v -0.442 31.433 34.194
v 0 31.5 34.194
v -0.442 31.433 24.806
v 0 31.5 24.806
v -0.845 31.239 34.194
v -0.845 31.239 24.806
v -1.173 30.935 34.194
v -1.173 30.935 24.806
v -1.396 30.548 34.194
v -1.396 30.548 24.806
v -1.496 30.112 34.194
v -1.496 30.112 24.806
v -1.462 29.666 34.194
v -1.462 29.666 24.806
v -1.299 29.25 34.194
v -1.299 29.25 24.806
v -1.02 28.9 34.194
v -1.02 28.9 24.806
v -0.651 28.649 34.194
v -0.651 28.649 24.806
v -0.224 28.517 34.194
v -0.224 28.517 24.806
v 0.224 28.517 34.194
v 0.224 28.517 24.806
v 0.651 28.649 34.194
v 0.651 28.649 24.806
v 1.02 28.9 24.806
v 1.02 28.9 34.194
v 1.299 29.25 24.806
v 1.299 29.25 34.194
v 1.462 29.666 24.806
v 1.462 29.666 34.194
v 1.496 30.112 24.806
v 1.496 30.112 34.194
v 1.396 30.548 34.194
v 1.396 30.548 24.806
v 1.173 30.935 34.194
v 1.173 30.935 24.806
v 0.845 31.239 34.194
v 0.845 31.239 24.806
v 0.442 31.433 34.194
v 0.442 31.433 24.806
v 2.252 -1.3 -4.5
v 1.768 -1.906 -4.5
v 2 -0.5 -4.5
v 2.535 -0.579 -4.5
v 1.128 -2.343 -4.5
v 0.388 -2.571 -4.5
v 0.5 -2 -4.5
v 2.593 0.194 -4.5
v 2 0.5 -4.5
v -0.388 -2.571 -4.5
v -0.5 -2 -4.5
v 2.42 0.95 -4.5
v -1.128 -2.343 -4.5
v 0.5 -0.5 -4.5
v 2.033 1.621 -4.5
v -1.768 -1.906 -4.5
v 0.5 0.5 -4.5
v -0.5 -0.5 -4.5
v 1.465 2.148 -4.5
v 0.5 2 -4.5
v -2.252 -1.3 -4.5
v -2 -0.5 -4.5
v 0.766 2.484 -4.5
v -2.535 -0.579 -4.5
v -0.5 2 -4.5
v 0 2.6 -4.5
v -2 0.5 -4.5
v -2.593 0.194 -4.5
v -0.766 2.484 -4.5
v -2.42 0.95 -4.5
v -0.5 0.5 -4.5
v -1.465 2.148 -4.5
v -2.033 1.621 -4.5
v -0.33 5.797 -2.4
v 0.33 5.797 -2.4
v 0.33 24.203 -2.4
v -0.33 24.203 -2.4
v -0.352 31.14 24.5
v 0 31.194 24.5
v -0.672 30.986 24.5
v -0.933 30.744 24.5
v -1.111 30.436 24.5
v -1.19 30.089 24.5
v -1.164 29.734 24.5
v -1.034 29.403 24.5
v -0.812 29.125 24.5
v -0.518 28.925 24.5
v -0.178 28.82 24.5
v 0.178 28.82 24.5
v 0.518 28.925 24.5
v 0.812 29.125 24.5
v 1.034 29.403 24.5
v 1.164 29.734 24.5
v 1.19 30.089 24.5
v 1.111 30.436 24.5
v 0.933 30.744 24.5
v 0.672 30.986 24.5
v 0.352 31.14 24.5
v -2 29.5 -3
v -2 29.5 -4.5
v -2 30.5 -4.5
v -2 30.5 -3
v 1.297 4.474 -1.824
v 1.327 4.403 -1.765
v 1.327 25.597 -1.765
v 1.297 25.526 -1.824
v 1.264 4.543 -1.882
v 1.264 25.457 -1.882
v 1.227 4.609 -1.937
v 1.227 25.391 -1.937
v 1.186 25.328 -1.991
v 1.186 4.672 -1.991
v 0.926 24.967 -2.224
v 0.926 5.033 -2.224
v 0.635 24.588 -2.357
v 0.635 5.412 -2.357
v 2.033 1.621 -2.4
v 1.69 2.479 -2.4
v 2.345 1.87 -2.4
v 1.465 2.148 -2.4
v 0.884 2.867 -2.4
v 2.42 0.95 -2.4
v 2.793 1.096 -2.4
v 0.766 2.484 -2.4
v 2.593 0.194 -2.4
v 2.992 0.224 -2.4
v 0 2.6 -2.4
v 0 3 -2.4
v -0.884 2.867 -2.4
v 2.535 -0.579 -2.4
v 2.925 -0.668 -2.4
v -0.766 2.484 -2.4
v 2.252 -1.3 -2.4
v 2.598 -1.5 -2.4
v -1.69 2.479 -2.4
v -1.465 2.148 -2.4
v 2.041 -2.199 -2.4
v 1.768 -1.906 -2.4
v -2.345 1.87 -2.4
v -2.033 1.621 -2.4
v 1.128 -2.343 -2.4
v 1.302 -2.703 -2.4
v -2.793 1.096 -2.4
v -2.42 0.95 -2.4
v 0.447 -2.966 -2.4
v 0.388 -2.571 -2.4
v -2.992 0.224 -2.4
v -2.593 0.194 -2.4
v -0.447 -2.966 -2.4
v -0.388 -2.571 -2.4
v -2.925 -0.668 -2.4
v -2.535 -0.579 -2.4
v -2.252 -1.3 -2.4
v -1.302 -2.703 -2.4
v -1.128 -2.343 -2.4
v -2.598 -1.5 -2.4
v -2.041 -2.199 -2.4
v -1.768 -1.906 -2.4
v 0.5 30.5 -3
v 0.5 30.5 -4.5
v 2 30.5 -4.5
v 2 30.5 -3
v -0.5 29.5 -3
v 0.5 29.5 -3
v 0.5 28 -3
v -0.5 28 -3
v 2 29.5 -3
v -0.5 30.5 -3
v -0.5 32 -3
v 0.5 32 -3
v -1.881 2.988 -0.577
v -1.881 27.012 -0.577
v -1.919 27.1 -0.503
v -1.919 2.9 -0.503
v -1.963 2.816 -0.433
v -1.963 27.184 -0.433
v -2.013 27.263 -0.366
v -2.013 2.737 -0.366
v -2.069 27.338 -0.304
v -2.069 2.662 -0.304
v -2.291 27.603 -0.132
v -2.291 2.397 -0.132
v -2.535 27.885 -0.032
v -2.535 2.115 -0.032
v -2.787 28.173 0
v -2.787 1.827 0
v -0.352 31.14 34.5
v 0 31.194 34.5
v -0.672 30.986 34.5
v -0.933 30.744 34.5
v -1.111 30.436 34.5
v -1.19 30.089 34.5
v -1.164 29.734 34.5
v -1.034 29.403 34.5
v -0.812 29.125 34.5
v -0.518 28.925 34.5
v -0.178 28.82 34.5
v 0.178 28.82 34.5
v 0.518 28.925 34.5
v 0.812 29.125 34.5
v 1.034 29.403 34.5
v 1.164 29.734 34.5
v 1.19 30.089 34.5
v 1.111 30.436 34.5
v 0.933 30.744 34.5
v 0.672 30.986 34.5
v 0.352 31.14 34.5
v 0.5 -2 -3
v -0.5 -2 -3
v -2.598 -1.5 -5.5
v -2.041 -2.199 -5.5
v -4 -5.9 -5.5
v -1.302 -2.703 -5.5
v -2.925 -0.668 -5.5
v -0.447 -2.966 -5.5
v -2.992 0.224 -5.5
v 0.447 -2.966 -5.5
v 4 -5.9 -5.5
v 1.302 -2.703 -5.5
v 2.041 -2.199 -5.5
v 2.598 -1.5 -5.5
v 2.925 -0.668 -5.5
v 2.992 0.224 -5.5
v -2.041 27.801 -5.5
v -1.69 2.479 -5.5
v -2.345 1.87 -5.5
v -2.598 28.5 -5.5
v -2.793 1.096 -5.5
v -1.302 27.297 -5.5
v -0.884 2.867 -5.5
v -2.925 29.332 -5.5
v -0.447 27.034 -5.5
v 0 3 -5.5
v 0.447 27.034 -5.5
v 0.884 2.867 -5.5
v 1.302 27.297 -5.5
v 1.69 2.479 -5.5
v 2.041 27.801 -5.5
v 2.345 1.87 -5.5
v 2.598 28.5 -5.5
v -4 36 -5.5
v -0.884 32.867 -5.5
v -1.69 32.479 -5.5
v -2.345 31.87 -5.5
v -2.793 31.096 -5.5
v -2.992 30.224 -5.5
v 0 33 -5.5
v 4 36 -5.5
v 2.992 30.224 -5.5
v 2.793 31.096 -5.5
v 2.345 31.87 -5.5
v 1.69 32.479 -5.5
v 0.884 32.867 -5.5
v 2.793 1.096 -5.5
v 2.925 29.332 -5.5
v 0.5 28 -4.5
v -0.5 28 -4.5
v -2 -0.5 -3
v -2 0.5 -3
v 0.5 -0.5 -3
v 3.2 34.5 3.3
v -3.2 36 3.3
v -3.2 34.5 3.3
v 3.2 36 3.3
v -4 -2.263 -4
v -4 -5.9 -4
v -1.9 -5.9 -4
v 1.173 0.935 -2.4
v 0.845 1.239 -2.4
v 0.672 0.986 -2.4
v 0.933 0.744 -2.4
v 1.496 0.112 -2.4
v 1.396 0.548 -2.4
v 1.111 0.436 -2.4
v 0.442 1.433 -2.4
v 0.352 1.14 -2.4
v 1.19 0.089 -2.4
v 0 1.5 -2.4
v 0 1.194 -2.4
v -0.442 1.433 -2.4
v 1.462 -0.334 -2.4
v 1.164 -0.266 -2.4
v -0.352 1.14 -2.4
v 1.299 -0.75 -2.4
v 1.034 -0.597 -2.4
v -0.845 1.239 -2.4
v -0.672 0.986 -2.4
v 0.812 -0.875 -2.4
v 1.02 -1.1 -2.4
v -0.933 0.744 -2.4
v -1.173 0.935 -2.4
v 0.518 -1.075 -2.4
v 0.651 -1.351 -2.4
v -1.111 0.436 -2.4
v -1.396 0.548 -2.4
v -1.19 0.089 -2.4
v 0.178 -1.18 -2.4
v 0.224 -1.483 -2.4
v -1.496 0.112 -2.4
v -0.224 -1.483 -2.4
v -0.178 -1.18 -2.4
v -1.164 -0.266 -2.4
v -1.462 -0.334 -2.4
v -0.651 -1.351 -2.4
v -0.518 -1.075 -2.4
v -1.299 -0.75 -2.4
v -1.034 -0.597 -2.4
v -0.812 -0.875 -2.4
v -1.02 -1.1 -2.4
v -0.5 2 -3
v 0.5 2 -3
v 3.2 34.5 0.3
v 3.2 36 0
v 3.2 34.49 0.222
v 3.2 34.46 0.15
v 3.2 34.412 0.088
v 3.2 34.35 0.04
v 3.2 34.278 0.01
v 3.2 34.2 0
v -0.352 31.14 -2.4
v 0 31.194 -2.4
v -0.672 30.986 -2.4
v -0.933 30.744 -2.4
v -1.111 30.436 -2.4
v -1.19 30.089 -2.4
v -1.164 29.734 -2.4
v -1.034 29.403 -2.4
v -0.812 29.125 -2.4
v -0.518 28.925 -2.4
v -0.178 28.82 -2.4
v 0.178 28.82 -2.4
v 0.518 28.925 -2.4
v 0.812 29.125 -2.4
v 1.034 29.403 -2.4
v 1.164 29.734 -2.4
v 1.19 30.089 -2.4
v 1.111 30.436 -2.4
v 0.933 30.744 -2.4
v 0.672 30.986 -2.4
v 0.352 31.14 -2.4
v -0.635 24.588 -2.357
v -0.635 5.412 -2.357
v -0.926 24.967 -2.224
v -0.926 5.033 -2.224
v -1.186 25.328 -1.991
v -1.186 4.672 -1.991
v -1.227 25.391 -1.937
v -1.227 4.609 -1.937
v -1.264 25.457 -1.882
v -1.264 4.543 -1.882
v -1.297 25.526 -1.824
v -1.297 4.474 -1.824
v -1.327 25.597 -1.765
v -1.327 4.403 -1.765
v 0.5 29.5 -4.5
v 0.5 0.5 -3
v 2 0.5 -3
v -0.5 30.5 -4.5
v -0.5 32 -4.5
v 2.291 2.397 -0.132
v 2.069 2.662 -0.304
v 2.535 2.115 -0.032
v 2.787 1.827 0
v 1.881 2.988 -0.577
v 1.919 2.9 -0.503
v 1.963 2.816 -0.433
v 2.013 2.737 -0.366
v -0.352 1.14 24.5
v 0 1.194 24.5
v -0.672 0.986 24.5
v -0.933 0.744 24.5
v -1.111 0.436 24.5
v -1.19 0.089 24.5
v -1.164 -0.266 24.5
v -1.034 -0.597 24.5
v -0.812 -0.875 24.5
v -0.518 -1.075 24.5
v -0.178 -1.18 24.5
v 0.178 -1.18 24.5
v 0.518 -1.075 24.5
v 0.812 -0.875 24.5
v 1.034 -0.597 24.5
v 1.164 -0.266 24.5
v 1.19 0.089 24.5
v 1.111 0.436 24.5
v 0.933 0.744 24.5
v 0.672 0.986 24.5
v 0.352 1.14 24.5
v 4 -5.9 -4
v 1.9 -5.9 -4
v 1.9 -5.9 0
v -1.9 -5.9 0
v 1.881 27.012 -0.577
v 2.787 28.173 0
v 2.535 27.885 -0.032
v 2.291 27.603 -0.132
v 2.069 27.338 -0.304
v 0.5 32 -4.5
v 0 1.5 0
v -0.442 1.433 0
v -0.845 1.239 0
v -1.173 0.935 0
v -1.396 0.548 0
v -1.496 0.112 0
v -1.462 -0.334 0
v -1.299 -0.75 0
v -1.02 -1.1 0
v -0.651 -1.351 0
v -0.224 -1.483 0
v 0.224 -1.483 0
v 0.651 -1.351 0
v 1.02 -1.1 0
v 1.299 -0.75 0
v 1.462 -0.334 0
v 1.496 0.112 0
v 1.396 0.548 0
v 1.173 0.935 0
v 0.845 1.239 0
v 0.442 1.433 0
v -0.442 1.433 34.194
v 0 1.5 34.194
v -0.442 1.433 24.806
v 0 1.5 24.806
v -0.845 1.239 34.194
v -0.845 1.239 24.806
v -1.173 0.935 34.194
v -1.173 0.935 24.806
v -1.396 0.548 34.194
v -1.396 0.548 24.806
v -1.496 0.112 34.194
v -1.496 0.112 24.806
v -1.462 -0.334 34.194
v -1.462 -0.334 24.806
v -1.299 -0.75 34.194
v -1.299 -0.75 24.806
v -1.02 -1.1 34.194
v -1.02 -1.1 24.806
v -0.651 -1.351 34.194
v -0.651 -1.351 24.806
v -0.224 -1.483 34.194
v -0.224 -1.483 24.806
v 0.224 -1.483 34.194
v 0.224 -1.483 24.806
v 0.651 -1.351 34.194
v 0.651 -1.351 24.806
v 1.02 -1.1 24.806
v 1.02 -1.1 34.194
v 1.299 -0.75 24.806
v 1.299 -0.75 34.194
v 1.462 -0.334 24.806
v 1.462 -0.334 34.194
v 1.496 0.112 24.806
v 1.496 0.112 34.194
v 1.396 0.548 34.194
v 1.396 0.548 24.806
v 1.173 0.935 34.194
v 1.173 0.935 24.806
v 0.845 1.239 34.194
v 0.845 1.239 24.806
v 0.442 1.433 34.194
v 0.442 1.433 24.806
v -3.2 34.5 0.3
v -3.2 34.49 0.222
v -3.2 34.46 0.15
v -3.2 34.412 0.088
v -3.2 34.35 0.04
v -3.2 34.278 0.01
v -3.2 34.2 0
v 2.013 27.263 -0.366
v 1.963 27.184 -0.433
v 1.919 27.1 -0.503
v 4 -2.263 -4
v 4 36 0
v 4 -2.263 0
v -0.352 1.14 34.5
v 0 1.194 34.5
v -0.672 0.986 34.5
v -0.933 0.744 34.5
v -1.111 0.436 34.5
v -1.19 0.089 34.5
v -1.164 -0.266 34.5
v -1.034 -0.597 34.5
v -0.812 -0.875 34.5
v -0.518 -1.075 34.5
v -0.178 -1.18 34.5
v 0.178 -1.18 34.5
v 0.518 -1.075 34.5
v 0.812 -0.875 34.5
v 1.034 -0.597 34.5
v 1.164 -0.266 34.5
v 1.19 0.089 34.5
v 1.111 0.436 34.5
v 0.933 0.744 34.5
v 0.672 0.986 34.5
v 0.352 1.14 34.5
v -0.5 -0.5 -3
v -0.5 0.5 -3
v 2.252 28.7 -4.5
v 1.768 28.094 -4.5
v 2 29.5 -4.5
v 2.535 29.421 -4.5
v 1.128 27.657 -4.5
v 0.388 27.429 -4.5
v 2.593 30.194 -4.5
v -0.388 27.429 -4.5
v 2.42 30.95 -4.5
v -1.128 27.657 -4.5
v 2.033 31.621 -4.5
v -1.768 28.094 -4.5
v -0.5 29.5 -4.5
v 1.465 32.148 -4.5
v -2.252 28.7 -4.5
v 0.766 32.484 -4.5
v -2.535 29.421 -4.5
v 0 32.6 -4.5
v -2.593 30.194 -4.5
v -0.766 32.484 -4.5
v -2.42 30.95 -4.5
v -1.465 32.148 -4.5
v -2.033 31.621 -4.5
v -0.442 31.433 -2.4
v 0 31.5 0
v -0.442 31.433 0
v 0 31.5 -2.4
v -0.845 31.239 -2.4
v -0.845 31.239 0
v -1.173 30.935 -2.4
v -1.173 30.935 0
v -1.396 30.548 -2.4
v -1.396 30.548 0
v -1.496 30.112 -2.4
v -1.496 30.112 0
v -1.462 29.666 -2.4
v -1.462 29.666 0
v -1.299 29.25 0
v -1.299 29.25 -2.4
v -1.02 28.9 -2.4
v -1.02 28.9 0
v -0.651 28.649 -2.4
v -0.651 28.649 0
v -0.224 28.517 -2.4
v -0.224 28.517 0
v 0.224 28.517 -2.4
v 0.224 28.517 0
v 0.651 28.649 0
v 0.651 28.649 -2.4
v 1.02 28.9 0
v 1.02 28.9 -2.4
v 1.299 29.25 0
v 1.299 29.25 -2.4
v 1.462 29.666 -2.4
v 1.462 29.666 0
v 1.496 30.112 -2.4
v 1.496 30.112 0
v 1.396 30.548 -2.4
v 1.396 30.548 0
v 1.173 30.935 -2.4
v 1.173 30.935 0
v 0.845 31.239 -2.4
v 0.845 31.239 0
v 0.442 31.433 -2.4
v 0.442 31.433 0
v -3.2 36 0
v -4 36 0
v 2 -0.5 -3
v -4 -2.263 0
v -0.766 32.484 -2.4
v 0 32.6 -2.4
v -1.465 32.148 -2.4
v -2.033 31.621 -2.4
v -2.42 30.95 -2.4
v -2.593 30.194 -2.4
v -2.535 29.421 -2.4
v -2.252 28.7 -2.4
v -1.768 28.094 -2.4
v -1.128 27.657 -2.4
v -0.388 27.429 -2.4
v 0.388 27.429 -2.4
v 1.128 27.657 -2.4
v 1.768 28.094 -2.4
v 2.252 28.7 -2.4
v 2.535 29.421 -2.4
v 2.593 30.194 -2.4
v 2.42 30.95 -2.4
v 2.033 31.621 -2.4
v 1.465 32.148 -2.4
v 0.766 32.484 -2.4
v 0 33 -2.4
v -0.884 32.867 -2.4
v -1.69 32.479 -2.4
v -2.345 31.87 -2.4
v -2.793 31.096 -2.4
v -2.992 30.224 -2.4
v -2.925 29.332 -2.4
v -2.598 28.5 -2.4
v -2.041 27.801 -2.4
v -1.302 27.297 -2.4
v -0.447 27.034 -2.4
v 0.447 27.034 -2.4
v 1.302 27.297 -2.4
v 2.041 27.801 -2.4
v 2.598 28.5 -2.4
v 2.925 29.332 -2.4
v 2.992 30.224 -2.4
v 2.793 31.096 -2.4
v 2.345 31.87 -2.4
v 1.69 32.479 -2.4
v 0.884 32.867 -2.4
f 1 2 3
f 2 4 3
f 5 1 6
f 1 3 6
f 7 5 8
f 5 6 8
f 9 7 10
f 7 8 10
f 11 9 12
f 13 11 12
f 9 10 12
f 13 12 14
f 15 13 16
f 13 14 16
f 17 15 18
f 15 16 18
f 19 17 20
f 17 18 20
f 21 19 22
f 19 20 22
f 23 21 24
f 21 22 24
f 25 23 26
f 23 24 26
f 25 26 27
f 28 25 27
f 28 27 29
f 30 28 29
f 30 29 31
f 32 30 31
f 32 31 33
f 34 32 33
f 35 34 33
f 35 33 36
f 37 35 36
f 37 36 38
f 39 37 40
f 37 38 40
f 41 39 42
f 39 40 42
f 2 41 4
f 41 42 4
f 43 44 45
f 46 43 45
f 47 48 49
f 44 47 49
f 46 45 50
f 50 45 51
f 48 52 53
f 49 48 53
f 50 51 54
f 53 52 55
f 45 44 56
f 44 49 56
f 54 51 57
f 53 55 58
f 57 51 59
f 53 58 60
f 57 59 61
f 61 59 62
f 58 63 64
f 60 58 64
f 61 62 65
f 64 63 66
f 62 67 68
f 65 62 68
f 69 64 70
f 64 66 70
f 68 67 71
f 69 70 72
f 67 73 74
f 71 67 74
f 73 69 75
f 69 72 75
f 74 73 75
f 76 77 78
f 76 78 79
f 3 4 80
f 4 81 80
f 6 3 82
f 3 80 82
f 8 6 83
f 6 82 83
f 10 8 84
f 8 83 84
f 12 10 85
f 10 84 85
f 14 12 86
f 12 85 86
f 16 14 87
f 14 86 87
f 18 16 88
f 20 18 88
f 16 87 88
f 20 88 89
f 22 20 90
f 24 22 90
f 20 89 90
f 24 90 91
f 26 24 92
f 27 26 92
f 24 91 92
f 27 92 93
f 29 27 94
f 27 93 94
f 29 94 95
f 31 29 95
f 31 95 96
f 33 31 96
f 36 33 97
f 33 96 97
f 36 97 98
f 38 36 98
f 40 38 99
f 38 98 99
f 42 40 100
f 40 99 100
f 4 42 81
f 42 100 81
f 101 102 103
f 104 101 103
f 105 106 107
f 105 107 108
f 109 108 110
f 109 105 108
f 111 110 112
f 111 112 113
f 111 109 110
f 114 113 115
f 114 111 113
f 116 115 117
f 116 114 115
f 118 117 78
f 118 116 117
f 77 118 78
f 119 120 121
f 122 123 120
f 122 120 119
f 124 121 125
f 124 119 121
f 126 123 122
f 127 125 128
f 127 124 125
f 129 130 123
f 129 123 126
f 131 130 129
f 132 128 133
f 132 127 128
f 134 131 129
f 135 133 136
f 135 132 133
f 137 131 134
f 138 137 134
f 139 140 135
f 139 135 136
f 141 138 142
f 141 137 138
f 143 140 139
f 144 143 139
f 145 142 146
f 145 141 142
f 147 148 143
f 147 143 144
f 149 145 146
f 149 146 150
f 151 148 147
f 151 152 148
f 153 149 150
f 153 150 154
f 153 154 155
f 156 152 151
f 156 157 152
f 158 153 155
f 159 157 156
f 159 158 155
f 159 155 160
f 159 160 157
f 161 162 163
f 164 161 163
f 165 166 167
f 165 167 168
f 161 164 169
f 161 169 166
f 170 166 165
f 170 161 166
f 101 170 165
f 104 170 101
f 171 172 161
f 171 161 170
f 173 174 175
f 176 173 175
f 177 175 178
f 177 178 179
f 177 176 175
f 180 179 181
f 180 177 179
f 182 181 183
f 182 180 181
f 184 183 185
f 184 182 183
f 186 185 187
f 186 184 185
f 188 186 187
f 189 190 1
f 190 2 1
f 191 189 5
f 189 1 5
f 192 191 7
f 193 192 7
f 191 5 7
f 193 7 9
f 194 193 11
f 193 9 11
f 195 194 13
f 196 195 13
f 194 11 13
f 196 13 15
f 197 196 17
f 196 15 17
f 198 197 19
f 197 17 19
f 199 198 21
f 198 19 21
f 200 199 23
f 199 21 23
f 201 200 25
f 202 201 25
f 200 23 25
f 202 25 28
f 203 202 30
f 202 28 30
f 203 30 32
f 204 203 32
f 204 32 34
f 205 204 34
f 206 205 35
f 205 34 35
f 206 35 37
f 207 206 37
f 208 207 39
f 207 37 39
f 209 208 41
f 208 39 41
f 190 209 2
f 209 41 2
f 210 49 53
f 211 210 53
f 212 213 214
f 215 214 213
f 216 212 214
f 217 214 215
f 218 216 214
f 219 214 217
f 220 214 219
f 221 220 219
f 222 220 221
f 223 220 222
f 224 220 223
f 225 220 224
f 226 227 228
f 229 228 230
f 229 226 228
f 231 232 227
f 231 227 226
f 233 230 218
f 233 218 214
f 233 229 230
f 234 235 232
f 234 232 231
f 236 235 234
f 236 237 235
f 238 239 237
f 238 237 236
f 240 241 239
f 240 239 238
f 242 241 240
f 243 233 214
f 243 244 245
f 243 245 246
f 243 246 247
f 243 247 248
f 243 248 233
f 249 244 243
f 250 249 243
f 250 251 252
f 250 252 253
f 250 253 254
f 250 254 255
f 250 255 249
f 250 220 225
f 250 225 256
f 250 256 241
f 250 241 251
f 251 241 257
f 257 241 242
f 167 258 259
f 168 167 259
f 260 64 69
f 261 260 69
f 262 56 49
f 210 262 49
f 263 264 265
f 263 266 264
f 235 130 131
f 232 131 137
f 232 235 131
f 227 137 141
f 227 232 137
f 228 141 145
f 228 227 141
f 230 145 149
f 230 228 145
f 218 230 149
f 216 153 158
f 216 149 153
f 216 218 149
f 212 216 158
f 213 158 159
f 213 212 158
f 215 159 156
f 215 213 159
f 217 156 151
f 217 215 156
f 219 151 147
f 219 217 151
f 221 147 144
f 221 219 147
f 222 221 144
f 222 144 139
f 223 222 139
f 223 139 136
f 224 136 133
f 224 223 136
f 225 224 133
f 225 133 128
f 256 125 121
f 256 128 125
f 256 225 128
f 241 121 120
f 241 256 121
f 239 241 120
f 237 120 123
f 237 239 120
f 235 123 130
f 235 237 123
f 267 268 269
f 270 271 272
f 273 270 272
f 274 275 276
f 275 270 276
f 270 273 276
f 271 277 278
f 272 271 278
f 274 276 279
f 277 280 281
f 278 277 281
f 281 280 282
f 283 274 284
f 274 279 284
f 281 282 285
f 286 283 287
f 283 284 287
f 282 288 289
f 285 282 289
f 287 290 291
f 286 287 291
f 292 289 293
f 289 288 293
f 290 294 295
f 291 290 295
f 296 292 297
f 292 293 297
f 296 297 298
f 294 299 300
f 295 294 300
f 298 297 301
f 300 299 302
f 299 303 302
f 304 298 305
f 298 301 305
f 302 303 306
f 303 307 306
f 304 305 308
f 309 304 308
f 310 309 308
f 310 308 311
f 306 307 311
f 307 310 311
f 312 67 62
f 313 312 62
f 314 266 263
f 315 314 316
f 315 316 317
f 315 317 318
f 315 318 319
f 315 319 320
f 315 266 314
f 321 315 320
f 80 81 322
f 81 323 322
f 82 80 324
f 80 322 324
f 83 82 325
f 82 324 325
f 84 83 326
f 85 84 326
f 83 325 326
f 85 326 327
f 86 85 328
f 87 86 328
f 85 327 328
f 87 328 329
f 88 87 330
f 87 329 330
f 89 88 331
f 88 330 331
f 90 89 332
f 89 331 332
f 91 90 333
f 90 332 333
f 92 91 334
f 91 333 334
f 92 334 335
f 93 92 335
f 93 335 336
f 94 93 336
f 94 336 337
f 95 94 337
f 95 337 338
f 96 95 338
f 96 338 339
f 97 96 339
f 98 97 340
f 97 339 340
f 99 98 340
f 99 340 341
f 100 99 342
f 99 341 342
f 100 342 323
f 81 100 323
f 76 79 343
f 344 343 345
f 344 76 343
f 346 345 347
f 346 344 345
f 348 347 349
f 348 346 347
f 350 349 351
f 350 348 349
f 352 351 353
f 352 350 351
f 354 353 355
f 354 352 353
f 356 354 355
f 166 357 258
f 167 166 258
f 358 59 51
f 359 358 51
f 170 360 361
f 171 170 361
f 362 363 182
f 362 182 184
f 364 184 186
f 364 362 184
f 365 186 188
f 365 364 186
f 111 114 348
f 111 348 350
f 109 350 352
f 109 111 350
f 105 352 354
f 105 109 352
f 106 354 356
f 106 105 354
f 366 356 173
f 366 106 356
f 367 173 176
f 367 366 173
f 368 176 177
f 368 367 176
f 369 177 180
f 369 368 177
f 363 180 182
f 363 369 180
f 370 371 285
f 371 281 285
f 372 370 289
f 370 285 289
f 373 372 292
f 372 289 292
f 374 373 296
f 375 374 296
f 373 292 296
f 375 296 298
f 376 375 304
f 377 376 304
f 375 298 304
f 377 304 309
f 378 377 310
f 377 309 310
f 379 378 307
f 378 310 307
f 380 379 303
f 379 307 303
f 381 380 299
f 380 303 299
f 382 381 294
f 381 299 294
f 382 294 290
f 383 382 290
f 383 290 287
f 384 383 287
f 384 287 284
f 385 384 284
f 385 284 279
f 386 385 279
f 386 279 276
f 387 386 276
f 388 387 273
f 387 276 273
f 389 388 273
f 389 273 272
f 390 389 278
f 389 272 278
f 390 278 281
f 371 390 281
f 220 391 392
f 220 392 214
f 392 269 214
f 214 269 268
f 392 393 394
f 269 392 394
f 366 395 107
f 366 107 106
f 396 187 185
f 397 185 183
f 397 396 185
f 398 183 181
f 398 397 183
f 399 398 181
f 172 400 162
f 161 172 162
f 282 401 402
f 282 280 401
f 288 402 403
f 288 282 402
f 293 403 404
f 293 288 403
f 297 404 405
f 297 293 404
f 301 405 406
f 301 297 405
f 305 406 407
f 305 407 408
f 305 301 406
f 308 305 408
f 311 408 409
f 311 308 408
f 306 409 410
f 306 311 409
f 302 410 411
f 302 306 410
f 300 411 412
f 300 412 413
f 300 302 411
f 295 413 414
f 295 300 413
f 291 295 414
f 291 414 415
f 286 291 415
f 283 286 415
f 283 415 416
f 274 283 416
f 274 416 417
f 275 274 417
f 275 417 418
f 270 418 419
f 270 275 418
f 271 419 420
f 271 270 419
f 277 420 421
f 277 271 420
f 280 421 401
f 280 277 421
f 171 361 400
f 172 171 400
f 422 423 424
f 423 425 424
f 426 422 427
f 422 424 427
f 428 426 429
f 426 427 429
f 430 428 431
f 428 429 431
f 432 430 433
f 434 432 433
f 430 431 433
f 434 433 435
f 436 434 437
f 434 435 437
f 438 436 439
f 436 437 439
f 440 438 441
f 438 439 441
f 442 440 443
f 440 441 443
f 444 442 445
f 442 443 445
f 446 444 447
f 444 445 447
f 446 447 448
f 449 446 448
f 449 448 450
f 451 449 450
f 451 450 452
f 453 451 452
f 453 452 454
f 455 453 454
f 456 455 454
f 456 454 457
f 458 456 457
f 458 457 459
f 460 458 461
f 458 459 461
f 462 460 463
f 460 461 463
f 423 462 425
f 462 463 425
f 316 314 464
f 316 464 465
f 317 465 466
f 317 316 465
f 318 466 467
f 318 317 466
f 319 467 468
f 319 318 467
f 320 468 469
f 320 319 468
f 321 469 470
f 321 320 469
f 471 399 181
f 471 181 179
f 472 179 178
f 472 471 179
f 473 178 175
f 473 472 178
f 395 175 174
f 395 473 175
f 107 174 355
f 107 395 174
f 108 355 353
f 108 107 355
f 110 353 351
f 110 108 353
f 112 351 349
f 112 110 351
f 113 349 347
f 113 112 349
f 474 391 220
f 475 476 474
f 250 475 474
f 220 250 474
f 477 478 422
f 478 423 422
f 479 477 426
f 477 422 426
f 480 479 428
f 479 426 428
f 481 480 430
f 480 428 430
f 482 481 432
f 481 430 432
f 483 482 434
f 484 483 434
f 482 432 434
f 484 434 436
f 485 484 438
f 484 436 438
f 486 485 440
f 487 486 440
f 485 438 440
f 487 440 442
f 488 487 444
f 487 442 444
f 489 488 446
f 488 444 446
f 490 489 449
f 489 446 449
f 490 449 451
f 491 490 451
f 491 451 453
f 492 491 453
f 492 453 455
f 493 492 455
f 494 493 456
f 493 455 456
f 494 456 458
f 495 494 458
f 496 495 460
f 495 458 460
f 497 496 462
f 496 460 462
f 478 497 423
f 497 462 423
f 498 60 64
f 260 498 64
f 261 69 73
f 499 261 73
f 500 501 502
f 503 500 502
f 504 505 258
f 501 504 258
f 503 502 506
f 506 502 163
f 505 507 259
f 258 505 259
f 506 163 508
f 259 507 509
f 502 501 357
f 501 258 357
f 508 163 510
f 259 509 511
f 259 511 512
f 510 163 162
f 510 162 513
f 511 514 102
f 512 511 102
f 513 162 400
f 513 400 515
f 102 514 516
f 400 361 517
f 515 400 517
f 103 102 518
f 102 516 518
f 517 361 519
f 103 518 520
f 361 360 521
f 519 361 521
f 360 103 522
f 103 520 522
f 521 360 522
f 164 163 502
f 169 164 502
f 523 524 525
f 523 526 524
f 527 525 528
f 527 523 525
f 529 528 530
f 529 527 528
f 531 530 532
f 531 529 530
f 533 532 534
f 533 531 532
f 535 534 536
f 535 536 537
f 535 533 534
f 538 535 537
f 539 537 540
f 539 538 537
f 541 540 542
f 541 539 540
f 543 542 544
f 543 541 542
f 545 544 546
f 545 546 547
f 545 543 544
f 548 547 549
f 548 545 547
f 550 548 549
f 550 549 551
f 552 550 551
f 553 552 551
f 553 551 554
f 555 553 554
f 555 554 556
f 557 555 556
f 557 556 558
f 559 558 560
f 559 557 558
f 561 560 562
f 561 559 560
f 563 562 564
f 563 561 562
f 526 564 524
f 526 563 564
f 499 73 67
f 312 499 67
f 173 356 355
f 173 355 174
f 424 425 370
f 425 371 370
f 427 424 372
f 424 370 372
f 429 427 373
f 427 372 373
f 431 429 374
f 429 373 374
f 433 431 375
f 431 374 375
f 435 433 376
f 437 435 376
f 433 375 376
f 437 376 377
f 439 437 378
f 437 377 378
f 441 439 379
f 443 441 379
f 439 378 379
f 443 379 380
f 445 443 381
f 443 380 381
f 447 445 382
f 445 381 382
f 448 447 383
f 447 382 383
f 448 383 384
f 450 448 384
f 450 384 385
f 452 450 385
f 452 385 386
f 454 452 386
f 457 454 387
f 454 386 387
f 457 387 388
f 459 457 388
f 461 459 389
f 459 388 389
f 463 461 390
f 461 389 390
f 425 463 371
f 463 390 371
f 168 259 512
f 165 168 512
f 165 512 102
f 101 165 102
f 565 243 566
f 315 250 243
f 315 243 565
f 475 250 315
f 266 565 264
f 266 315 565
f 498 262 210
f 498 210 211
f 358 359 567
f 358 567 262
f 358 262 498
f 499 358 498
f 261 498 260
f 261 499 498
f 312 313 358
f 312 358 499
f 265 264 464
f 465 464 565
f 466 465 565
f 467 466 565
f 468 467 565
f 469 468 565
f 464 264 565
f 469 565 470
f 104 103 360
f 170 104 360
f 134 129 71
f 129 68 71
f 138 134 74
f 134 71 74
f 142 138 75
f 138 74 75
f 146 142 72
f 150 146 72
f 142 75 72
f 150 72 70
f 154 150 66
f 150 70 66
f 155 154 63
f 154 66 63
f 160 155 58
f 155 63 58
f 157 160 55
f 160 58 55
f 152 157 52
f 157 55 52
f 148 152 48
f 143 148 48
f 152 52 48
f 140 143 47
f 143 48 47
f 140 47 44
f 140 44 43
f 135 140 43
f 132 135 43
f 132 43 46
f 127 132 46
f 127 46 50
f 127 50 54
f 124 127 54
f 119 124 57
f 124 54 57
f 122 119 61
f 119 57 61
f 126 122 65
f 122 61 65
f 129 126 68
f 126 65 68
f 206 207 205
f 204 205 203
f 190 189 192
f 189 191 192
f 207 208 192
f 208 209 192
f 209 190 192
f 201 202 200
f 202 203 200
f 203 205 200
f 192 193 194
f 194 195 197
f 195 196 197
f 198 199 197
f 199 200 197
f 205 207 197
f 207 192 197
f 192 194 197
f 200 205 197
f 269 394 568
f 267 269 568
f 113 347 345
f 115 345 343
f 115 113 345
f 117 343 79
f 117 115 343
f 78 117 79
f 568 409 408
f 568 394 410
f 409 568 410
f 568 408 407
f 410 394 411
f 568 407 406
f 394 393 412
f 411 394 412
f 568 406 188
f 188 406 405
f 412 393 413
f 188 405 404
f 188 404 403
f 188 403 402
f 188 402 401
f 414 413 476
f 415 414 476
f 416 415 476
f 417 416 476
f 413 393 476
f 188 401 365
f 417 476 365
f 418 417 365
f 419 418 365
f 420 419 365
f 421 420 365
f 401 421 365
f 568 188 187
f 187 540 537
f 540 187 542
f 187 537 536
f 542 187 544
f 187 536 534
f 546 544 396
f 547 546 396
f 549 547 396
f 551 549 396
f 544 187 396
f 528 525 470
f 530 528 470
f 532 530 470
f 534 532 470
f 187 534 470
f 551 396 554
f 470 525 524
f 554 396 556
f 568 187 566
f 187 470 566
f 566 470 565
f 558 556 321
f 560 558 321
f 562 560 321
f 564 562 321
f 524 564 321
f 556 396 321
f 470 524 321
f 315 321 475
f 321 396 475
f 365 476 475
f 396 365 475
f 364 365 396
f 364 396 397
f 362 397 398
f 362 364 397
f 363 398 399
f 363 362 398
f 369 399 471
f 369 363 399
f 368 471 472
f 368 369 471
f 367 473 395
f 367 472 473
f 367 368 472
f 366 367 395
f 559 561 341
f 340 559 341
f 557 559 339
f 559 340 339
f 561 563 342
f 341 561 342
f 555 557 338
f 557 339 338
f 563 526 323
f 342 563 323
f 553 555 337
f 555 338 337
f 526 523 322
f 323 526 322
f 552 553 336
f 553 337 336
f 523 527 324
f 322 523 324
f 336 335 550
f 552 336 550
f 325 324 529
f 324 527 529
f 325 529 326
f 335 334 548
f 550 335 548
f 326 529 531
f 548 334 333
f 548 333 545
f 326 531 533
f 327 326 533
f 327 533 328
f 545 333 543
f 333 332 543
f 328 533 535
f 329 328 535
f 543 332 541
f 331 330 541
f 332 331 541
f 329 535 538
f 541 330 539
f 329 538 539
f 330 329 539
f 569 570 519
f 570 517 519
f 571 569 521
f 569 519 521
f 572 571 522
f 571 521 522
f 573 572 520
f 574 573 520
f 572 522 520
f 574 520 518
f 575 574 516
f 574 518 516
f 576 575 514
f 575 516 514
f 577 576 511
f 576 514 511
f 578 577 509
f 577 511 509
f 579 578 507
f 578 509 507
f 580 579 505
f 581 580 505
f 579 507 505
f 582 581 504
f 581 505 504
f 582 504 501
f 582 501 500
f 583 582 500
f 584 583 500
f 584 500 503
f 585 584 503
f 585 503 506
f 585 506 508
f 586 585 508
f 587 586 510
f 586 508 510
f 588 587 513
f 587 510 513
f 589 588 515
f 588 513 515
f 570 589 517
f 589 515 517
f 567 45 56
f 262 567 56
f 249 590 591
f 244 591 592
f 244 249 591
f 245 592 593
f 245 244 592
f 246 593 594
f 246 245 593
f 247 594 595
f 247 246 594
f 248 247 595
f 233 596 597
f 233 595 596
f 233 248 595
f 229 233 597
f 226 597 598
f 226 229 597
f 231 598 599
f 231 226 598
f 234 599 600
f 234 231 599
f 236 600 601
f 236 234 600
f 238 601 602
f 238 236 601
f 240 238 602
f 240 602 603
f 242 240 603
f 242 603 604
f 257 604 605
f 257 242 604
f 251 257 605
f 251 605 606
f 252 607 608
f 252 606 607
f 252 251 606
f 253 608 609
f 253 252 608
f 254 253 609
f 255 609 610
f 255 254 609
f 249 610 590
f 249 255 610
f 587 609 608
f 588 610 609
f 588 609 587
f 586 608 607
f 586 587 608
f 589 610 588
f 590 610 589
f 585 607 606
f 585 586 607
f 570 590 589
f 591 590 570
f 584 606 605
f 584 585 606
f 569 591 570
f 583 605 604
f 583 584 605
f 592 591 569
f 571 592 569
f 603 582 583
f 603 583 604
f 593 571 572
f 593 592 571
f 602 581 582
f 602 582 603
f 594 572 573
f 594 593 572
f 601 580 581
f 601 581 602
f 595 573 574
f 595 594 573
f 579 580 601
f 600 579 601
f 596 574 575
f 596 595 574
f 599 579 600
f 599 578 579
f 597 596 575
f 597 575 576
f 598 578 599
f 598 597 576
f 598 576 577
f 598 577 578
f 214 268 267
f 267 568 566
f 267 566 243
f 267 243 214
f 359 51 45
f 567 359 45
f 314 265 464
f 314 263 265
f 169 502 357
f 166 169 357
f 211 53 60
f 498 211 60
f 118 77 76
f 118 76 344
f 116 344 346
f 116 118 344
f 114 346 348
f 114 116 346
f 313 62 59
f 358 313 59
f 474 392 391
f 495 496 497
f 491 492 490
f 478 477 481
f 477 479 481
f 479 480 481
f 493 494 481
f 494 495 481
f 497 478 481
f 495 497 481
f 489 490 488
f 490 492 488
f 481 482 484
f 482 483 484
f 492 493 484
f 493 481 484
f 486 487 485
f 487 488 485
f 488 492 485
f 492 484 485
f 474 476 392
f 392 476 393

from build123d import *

# Parameters (mm, degrees)
BOSS_EXTRUDE1_DEPTH      = 4
BOSS_EXTRUDE1_DEPTH_BACK = 4
SKETCH1_W                = 5.5
SKETCH1_H                = 41.9
BOSS_EXTRUDE2_DEPTH      = 3.2
BOSS_EXTRUDE2_DEPTH_BACK = 3.2
CUT_EXTRUDE1_DEPTH       = 13.2
CUT_EXTRUDE1_DEPTH_BACK  = 13.2
BOSS_EXTRUDE3_DEPTH      = 2.85
BOSS_EXTRUDE3_DEPTH_BACK = 2.85
BOSS_EXTRUDE4_DEPTH      = 2.85
BOSS_EXTRUDE4_DEPTH_BACK = 2.85
CUT_EXTRUDE2_DEPTH       = 4
CUT_EXTRUDE3_DEPTH       = 1.5
CUT_EXTRUDE3_DEPTH_BACK  = 1.5
CUT_EXTRUDE4_DEPTH       = 1.5
CUT_EXTRUDE4_DEPTH_BACK  = 1.5


with BuildPart() as part:
    # Sketch1 → Boss-Extrude1 (new, two sides: drawn at the far end of the back side and taken through both)
    with BuildSketch(Plane(origin=(0, 0, 0), x_dir=(0, 0, -1), z_dir=(1, 0, 0)).offset(-BOSS_EXTRUDE1_DEPTH_BACK)):
        with Locations((2.75, 15.05)):
            Rectangle(SKETCH1_W, SKETCH1_H)
    extrude(amount=BOSS_EXTRUDE1_DEPTH + BOSS_EXTRUDE1_DEPTH_BACK)

    # Sketch2 → Boss-Extrude2 (add, two sides: drawn at the far end of the back side and taken through both)
    with BuildSketch(Plane(origin=(0, 0, 0), x_dir=(0, 0, -1), z_dir=(1, 0, 0)).offset(-BOSS_EXTRUDE2_DEPTH_BACK)):
        with BuildLine():
            Line((-3.3, 34.5), (-0.3, 34.5))
            ThreePointArc((-0.3, 34.5), (-0.087867966, 34.412132034), (0, 34.2))
            Line((0, 34.2), (0, 36))
            Line((0, 36), (-3.3, 36))
            Line((-3.3, 36), (-3.3, 34.5))
        make_face()
    extrude(amount=BOSS_EXTRUDE2_DEPTH + BOSS_EXTRUDE2_DEPTH_BACK)

    # Sketch3 → Cut-Revolve1 (revolve, cut)
    with BuildSketch(Plane(origin=(0, 0, 0), x_dir=(0, 0, -1), z_dir=(1, 0, 0))):
        Polygon((0, 30), (0, 31.5), (2.4, 31.5), (2.4, 33), (5.5, 33), (5.5, 30), align=None)
    revolve(axis=Axis((0, 30, -5.5), (0, 0, 1)), mode=Mode.SUBTRACT)

    # Sketch4 → Cut-Revolve2 (revolve, cut)
    with BuildSketch(Plane(origin=(0, 0, 0), x_dir=(0, 0, -1), z_dir=(1, 0, 0))):
        Polygon((0, 0), (0, 1.5), (2.4, 1.5), (2.4, 3), (5.5, 3), (5.5, 0), align=None)
    revolve(axis=Axis((0, 0, -5.5), (0, 0, 1)), mode=Mode.SUBTRACT)

    # Sketch5 → Cut-Extrude1 (cut, two sides: drawn at the far end of the back side and taken through both)
    with BuildSketch(Plane(origin=(0, 15, 0), x_dir=(1, 0, 0), z_dir=(0, 1, 0)).offset(-CUT_EXTRUDE1_DEPTH_BACK)):
        with BuildLine():
            Line((-3.5, -2.4), (3.5, -2.4))
            Line((3.5, -2.4), (3.5, 0))
            Line((3.5, 0), (2.787070261, 0))
            ThreePointArc((2.787070261, 0), (2.249770652, 0.156608554), (1.880762474, 0.577381738))
            Line((1.880762474, 0.577381738), (1.327022899, 1.764880088))
            ThreePointArc((1.327022899, 1.764880088), (0.921113903, 2.22773059), (0.330084334, 2.4))
            Line((0.330084334, 2.4), (-0.330084334, 2.4))
            ThreePointArc((-0.330084334, 2.4), (-0.921113903, 2.22773059), (-1.327022899, 1.764880088))
            Line((-1.327022899, 1.764880088), (-1.880762474, 0.577381738))
            ThreePointArc((-1.880762474, 0.577381738), (-2.249770652, 0.156608554), (-2.787070261, 0))
            Line((-2.787070261, 0), (-3.5, 0))
            Line((-3.5, 0), (-3.5, -2.4))
        make_face()
    extrude(amount=CUT_EXTRUDE1_DEPTH + CUT_EXTRUDE1_DEPTH_BACK, mode=Mode.SUBTRACT)

    # Sketch6 → Boss-Extrude3 (add, two sides: drawn at the far end of the back side and taken through both)
    with BuildSketch(Plane(origin=(0, 0, 0), x_dir=(0, 0, -1), z_dir=(1, 0, 0)).offset(-BOSS_EXTRUDE3_DEPTH_BACK)):
        with BuildLine():
            Line((0, 1.626838695), (2.4, 1.626838695))
            Line((2.4, 1.626838695), (2.4, 5.797156532))
            ThreePointArc((2.4, 5.797156532), (2.294462086, 5.198621281), (1.990577775, 4.672278215))
            Line((1.990577775, 4.672278215), (0.304142224, 2.662462588))
            ThreePointArc((0.304142224, 2.662462588), (0.078399593, 2.271464882), (0, 1.826838695))
            Line((0, 1.826838695), (0, 1.626838695))
        make_face()
    extrude(amount=BOSS_EXTRUDE3_DEPTH + BOSS_EXTRUDE3_DEPTH_BACK)

    # Sketch7 → Boss-Extrude4 (add, two sides: drawn at the far end of the back side and taken through both)
    with BuildSketch(Plane(origin=(0, 0, 0), x_dir=(0, 0, -1), z_dir=(1, 0, 0)).offset(-BOSS_EXTRUDE4_DEPTH_BACK)):
        with BuildLine():
            Line((0, 28.373161305), (0, 28.173161305))
            ThreePointArc((0, 28.173161305), (0.078399593, 27.728535118), (0.304142224, 27.337537412))
            Line((0.304142224, 27.337537412), (1.990577775, 25.327721785))
            ThreePointArc((1.990577775, 25.327721785), (2.294462086, 24.801378719), (2.4, 24.202843468))
            Line((2.4, 24.202843468), (2.4, 28.373161305))
            Line((2.4, 28.373161305), (0, 28.373161305))
        make_face()
    extrude(amount=BOSS_EXTRUDE4_DEPTH + BOSS_EXTRUDE4_DEPTH_BACK)

    # Sketch8 → Cut-Extrude2 (cut)
    with BuildSketch(Plane.XY):
        Polygon((-15, -15.264317181), (16.073788546, -15.264317181), (16.073788546, -1.569872981), (4.4, -1.569872981), (1.9, -5.9), (-1.9, -5.9), (-4.4, -1.569872981), (-15, -1.569872981), align=None)
    extrude(amount=-CUT_EXTRUDE2_DEPTH, mode=Mode.SUBTRACT)

    # Sketch9 → Revolve1 (revolve)
    with BuildSketch(Plane(origin=(0, 0, 0), x_dir=(0, 0, -1), z_dir=(1, 0, 0))):
        Polygon((-34.5, 30), (-34.5, 31.1935), (-34.1935, 31.5), (-24.8065, 31.5), (-24.5, 31.1935), (2.4, 31.1935), (2.4, 32.6), (4.5, 32.6), (4.5, 30), align=None)
    revolve(axis=Axis((0, 30, -4.5), (0, 0, 1)))

    # Sketch10 → Revolve2 (revolve)
    with BuildSketch(Plane(origin=(0, 0, 0), x_dir=(0, 0, -1), z_dir=(1, 0, 0))):
        Polygon((-34.5, 0), (-34.5, 1.1935), (-34.1935, 1.5), (-24.8065, 1.5), (-24.5, 1.1935), (2.4, 1.1935), (2.4, 2.6), (4.5, 2.6), (4.5, 0), align=None)
    revolve(axis=Axis((0, 0, -4.5), (0, 0, 1)))

    # Sketch11 → Cut-Extrude3 (cut, two sides: drawn at the far end of the back side and taken through both)
    with BuildSketch(Plane(origin=(0, 0, -4.5), x_dir=(-1, 0, 0), z_dir=(0, 0, -1)).offset(-CUT_EXTRUDE3_DEPTH_BACK)):
        Polygon((0.5, 28), (0.5, 29.5), (2, 29.5), (2, 30.5), (0.5, 30.5), (0.5, 32), (-0.5, 32), (-0.5, 30.5), (-2, 30.5), (-2, 29.5), (-0.5, 29.5), (-0.5, 28), align=None)
    extrude(amount=CUT_EXTRUDE3_DEPTH + CUT_EXTRUDE3_DEPTH_BACK, mode=Mode.SUBTRACT)

    # Sketch12 → Cut-Extrude4 (cut, two sides: drawn at the far end of the back side and taken through both)
    with BuildSketch(Plane(origin=(0, 0, -4.5), x_dir=(-1, 0, 0), z_dir=(0, 0, -1)).offset(-CUT_EXTRUDE4_DEPTH_BACK)):
        Polygon((0.5, -2), (0.5, -0.5), (2, -0.5), (2, 0.5), (0.5, 0.5), (0.5, 2), (-0.5, 2), (-0.5, 0.5), (-2, 0.5), (-2, -0.5), (-0.5, -0.5), (-0.5, -2), align=None)
    extrude(amount=CUT_EXTRUDE4_DEPTH + CUT_EXTRUDE4_DEPTH_BACK, mode=Mode.SUBTRACT)


solid = part.part
